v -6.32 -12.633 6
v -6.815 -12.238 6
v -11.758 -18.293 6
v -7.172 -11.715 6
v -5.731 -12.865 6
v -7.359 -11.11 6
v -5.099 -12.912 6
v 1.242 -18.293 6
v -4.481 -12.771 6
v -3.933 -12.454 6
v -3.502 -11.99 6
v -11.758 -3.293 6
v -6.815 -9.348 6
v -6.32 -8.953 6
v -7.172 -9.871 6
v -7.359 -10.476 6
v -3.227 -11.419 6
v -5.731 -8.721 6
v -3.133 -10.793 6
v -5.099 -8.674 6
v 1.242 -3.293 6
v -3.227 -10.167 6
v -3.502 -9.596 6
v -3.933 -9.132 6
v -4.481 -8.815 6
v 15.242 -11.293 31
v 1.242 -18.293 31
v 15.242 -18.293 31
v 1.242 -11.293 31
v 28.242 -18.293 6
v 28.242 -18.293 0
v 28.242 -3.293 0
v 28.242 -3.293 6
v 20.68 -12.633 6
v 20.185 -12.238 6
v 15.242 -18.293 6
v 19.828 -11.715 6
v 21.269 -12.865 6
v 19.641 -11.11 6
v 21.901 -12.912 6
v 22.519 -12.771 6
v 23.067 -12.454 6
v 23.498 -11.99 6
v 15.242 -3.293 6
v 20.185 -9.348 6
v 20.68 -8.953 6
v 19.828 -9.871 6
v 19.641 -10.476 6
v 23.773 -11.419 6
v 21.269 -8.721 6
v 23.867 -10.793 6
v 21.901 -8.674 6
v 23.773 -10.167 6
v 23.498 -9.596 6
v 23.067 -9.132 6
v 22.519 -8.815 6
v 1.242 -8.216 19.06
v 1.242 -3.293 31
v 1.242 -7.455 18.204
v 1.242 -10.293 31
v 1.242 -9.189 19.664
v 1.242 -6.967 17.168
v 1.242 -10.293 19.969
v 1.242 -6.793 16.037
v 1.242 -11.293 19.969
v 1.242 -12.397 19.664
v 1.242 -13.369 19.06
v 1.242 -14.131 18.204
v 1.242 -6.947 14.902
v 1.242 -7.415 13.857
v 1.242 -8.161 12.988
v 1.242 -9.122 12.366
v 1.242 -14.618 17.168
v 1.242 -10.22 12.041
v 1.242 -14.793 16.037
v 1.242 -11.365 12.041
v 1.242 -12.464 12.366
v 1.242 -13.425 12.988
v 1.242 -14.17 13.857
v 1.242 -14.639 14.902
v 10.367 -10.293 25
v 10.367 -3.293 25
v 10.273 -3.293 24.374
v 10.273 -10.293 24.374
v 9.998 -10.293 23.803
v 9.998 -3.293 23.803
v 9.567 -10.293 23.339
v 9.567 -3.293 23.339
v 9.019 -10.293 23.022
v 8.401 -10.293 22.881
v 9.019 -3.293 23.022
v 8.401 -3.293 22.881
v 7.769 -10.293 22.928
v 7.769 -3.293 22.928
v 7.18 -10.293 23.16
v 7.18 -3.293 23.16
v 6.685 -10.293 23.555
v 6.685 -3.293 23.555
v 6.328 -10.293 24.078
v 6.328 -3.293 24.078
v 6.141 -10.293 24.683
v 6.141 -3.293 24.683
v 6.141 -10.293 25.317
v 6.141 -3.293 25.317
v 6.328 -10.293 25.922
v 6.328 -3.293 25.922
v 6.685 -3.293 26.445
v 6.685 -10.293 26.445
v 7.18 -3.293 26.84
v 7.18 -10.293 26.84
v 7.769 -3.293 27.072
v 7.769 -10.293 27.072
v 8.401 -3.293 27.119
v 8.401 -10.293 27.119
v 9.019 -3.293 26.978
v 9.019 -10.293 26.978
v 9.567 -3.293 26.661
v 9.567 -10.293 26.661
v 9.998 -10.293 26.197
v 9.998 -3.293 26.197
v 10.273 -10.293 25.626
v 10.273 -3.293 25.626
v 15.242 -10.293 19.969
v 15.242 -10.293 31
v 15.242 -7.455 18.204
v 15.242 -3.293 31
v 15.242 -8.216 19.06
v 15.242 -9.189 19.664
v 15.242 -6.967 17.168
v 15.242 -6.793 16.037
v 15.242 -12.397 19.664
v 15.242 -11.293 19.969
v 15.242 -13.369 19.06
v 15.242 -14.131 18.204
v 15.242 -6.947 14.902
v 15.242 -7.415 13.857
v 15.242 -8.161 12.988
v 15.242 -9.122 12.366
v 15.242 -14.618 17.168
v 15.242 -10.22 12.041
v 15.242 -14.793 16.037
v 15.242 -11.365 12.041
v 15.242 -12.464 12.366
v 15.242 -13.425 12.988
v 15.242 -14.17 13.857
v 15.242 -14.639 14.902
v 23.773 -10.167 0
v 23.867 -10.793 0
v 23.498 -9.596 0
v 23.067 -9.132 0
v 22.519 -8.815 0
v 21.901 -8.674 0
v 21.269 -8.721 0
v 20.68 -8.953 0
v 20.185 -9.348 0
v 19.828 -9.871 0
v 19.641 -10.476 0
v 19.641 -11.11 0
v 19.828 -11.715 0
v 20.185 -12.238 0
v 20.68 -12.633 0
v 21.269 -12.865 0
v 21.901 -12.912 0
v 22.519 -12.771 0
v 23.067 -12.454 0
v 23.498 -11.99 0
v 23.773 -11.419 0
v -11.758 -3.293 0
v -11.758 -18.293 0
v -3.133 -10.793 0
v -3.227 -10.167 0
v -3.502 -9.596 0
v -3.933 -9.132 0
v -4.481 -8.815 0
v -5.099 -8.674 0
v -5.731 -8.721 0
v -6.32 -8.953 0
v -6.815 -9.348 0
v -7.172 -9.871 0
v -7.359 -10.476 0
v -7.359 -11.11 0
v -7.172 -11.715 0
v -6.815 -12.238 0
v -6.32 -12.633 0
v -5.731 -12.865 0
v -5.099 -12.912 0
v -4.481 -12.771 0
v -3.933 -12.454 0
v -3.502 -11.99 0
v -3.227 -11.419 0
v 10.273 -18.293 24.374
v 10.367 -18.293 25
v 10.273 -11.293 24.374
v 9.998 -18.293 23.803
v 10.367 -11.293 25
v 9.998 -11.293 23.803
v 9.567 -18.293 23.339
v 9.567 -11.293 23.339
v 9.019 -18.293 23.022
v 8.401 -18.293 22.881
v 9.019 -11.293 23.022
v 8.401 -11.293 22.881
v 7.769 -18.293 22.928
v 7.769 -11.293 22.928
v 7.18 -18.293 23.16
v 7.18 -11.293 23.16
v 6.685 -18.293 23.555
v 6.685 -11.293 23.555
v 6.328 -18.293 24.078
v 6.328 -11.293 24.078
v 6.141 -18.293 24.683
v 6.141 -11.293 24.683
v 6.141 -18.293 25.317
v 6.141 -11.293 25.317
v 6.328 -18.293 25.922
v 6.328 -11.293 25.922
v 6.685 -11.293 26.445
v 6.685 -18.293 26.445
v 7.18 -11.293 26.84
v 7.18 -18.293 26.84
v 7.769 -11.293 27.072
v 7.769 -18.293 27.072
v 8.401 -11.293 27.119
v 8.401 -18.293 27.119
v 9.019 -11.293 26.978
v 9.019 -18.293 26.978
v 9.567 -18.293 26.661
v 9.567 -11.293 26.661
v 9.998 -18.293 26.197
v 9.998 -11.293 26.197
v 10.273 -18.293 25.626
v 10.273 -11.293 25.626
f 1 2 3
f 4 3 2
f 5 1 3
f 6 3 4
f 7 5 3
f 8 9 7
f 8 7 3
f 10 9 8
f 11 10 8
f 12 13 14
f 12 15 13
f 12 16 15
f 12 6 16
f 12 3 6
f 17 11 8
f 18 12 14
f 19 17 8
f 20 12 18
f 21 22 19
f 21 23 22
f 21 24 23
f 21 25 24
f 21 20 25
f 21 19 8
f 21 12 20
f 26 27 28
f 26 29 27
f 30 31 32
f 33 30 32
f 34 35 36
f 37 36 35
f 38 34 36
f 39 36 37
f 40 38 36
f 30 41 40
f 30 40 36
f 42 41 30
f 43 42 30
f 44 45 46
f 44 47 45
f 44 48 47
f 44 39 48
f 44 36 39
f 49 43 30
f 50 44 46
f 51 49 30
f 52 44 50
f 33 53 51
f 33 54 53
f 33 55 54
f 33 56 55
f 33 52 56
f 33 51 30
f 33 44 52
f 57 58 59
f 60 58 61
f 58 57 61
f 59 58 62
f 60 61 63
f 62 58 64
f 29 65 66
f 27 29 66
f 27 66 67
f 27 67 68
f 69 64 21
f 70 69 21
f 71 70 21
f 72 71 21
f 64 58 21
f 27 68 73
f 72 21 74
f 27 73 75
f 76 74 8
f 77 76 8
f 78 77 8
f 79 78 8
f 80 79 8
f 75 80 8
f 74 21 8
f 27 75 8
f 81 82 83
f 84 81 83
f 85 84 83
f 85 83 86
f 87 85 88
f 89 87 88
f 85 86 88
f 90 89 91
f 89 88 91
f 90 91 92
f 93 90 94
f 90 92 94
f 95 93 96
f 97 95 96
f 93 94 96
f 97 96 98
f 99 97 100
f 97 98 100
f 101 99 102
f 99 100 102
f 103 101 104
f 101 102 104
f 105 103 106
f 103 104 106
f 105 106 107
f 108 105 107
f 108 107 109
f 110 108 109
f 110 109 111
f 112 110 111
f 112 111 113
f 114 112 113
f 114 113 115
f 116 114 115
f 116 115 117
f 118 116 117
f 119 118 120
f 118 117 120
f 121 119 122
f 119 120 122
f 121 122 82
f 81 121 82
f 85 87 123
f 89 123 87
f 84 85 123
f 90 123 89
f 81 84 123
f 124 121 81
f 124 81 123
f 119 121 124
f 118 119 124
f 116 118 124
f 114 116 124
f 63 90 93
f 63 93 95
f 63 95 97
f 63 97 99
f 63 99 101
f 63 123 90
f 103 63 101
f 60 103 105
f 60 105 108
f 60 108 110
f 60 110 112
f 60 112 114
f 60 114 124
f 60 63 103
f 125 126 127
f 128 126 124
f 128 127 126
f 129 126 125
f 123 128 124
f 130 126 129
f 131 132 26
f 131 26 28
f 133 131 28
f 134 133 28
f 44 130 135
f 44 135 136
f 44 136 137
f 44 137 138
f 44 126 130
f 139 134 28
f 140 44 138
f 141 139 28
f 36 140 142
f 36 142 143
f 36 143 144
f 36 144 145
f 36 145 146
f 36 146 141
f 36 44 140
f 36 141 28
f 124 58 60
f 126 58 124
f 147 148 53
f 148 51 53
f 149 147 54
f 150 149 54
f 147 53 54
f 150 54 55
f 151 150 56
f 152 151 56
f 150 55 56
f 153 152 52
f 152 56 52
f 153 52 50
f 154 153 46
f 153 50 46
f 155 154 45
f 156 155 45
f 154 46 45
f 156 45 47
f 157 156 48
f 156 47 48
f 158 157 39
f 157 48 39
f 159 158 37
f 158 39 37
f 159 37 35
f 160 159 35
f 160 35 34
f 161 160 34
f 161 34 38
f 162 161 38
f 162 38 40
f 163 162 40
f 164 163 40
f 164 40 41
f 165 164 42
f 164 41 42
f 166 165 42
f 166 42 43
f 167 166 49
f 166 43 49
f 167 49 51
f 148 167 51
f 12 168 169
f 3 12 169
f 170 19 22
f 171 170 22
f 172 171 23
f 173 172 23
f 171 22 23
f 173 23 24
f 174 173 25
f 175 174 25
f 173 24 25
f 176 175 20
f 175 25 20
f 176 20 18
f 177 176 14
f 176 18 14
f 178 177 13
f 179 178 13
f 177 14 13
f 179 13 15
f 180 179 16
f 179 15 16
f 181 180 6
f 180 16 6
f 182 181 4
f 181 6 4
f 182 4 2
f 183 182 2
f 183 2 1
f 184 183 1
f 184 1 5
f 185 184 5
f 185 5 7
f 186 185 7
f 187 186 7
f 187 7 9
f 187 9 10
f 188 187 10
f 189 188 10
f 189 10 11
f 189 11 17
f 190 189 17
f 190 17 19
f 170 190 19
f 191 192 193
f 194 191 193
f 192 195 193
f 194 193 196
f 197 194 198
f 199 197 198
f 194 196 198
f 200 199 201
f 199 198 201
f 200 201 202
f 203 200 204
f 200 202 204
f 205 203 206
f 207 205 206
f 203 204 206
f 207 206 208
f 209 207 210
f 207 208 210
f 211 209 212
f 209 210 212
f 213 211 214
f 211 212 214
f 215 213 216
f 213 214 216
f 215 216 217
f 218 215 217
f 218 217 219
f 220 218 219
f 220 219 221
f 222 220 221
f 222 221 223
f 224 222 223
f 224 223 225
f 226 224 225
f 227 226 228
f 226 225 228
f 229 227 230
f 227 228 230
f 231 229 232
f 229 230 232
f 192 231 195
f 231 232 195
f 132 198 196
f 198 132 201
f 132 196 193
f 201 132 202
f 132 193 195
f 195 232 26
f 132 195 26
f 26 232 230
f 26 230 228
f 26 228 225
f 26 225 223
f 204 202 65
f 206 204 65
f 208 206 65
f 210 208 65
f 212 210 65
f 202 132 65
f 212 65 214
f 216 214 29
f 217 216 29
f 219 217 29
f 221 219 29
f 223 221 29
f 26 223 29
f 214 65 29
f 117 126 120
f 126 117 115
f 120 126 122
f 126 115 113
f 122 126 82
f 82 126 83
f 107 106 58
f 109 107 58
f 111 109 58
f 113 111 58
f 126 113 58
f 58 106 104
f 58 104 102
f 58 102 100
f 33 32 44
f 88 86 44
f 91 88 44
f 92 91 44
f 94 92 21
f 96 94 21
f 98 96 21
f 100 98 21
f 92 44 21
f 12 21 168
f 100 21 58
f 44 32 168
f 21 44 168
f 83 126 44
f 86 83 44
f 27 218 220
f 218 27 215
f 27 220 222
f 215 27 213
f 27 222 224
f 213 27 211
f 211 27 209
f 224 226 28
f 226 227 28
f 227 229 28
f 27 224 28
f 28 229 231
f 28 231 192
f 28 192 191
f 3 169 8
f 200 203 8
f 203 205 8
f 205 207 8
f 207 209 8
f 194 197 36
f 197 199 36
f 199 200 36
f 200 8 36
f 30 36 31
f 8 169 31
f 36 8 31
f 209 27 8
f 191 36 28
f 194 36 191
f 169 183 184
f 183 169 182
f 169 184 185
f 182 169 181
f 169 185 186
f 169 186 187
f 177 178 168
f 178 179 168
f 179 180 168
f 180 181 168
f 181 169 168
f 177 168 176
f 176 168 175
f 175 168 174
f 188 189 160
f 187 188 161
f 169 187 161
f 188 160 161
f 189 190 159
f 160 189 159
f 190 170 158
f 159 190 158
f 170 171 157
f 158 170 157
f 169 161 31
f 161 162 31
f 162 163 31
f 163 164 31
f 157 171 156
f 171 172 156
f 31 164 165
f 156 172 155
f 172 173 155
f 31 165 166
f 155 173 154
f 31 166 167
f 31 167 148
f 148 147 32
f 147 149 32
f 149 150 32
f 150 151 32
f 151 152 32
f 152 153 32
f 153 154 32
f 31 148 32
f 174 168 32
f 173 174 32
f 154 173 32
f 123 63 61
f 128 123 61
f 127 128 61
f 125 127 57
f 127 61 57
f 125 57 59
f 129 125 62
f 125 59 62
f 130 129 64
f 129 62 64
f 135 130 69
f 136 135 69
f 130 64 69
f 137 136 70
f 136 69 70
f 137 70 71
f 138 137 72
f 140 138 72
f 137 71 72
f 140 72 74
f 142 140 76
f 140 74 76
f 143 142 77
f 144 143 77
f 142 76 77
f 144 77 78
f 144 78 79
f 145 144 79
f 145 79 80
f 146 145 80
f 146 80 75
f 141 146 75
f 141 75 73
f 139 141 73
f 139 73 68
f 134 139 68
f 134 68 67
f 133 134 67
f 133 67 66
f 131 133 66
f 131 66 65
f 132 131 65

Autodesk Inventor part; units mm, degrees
ref_plane "YZ Plane" through (0, 0, 0) normal (1, 0, 0) x (0, 1, 0)
ref_plane "XZ Plane" through (0, 0, 0) normal (0, 1, 0) x (-1, 0, 0)
ref_plane "XY Plane" through (0, 0, 0) normal (0, 0, 1) x (1, 0, 0)
sketch "Sketch1" plane through (0, 0, 0) normal (0, 0, 1) x (1, 0, 0)
  line L0 (-11.7577, -18.2929) -> (28.2423, -18.2929)
  line L1 (28.2423, -18.2929) -> (28.2423, -3.2929)
  line L2 (28.2423, -3.2929) -> (-11.7577, -3.2929)
  line L3 (-11.7577, -3.2929) -> (-11.7577, -18.2929)
  point P0 (0, 0)
  dimension "d0" = 40
  dimension "d1" = 15
extrude "Extrusion1" add sketch "Sketch1" along normal blind 6
sketch "Sketch2" plane through (0, 0, 6) normal (0, 0, 1) x (1, 0, 0)
  line L0 (28.2423, -3.2929) -> (-11.7577, -3.2929) projected
  line L1 (15.2423, -3.2929) -> (15.2423, -18.2929)
  line L2 (1.2423, -3.2929) -> (1.2423, -18.2929)
  line L3 (-11.7577, -18.2929) -> (28.2423, -18.2929) projected
  line L4 (15.2423, -6.7382) -> (28.2423, -6.7382) construction
  line L5 (28.2423, -18.2929) -> (28.2423, -3.2929) projected
  line L6 (1.2423, -6.7382) -> (-11.7577, -6.7382) construction
  line L7 (-11.7577, -3.2929) -> (-11.7577, -18.2929) projected
  point P0 (0, 0)
  dimension "d4" = 14
extrude "Extrusion2" add sketch "Sketch2" along normal blind 25 contours L1 L3 L2 L0
sketch "Sketch4" plane through (0, 0, 6) normal (0, 0, 1) x (1, 0, 0)
  circle A0 centre (21.7423, -10.7929) radius 2.125
  line L0 (21.7423, -10.7929) -> (21.7423, -3.2929) construction
  line L1 (21.7423, -10.7929) -> (21.7423, -18.2929) construction
  line L2 (15.2423, -18.2929) -> (28.2423, -18.2929) projected
  line L3 (21.7423, -10.7929) -> (28.2423, -10.7929) construction
  line L4 (21.7423, -10.7929) -> (15.2423, -10.7929) construction
  line L5 (15.2423, -18.2929) -> (15.2423, -3.2929) projected
  line L6 (28.2423, -3.2929) -> (15.2423, -3.2929) projected
  line L7 (28.2423, -18.2929) -> (28.2423, -3.2929) projected
  circle A1 centre (-5.2577, -10.7929) radius 2.125
  line L8 (-5.2577, -10.7929) -> (-5.2577, -3.2929) construction
  line L9 (-5.2577, -10.7929) -> (-11.7577, -10.7929) construction
  line L10 (-11.7577, -3.2929) -> (-11.7577, -18.2929) projected
  line L11 (-5.2577, -10.7929) -> (-5.2577, -18.2929) construction
  line L12 (-5.2577, -10.7929) -> (1.2423, -10.7929) construction
  line L13 (1.2423, -3.2929) -> (1.2423, -18.2929) projected
  point P0 (0, 0)
  dimension "d12" = 4.25
  dimension "d13" = 4.25
extrude "Extrusion4" cut sketch "Sketch4" against normal up to next contours A0 | A1
sketch "Sketch5" plane through (1.2423, -18.2929, 6) normal (-1, 0, 0) x (0, 0, 1)
  circle A0 centre (10, 7.5) radius 4
  line L0 (10, 7.5) -> (10, 15) construction
  line L1 (10, 7.5) -> (10, 0) construction
  line L2 (-6, 15) -> (-6, 0) projected
  line L3 (13.9686, 7) -> (25, 7)
  line L4 (13.9686, 8) -> (25, 8)
  line L5 (25, 15) -> (25, 0) projected
  line L6 (27.4068, 8) -> (27.4068, 15) construction
  line L7 (27.4068, 7) -> (27.4068, 0) construction
  line L8 (0, 0) -> (25, 0) projected
  line L9 (0, 15) -> (25, 15) projected
  line L10 (10, 7.5) -> (10, 0) construction
  line L11 (0, 0) -> (25, 0) projected
  point P0 (-6, 18.2929)
  dimension "d16" = 8
  dimension "d17" = 16
  dimension "d18" = 1
extrude "Extrusion5" cut sketch "Sketch5" against normal up to next
sketch "Sketch6" plane through (-11.7577, -3.2929, 0) normal (0, 1, 0) x (1, 0, 0)
  circle A0 centre (20, -25) radius 2.125
  line L0 (27, -31) -> (13, -31) projected
  line L1 (20, -25) -> (27, -25) construction
  line L2 (20, -25) -> (13, -25) construction
  line L3 (27, -6) -> (27, -31) projected
  line L4 (13, -6) -> (13, -31) projected
  point P0 (11.7577, 0)
  dimension "d21" = 4.25
  dimension "d22" = 6
extrude "Extrusion6" cut sketch "Sketch6" against normal through all
properties part number "YRodClamp"
